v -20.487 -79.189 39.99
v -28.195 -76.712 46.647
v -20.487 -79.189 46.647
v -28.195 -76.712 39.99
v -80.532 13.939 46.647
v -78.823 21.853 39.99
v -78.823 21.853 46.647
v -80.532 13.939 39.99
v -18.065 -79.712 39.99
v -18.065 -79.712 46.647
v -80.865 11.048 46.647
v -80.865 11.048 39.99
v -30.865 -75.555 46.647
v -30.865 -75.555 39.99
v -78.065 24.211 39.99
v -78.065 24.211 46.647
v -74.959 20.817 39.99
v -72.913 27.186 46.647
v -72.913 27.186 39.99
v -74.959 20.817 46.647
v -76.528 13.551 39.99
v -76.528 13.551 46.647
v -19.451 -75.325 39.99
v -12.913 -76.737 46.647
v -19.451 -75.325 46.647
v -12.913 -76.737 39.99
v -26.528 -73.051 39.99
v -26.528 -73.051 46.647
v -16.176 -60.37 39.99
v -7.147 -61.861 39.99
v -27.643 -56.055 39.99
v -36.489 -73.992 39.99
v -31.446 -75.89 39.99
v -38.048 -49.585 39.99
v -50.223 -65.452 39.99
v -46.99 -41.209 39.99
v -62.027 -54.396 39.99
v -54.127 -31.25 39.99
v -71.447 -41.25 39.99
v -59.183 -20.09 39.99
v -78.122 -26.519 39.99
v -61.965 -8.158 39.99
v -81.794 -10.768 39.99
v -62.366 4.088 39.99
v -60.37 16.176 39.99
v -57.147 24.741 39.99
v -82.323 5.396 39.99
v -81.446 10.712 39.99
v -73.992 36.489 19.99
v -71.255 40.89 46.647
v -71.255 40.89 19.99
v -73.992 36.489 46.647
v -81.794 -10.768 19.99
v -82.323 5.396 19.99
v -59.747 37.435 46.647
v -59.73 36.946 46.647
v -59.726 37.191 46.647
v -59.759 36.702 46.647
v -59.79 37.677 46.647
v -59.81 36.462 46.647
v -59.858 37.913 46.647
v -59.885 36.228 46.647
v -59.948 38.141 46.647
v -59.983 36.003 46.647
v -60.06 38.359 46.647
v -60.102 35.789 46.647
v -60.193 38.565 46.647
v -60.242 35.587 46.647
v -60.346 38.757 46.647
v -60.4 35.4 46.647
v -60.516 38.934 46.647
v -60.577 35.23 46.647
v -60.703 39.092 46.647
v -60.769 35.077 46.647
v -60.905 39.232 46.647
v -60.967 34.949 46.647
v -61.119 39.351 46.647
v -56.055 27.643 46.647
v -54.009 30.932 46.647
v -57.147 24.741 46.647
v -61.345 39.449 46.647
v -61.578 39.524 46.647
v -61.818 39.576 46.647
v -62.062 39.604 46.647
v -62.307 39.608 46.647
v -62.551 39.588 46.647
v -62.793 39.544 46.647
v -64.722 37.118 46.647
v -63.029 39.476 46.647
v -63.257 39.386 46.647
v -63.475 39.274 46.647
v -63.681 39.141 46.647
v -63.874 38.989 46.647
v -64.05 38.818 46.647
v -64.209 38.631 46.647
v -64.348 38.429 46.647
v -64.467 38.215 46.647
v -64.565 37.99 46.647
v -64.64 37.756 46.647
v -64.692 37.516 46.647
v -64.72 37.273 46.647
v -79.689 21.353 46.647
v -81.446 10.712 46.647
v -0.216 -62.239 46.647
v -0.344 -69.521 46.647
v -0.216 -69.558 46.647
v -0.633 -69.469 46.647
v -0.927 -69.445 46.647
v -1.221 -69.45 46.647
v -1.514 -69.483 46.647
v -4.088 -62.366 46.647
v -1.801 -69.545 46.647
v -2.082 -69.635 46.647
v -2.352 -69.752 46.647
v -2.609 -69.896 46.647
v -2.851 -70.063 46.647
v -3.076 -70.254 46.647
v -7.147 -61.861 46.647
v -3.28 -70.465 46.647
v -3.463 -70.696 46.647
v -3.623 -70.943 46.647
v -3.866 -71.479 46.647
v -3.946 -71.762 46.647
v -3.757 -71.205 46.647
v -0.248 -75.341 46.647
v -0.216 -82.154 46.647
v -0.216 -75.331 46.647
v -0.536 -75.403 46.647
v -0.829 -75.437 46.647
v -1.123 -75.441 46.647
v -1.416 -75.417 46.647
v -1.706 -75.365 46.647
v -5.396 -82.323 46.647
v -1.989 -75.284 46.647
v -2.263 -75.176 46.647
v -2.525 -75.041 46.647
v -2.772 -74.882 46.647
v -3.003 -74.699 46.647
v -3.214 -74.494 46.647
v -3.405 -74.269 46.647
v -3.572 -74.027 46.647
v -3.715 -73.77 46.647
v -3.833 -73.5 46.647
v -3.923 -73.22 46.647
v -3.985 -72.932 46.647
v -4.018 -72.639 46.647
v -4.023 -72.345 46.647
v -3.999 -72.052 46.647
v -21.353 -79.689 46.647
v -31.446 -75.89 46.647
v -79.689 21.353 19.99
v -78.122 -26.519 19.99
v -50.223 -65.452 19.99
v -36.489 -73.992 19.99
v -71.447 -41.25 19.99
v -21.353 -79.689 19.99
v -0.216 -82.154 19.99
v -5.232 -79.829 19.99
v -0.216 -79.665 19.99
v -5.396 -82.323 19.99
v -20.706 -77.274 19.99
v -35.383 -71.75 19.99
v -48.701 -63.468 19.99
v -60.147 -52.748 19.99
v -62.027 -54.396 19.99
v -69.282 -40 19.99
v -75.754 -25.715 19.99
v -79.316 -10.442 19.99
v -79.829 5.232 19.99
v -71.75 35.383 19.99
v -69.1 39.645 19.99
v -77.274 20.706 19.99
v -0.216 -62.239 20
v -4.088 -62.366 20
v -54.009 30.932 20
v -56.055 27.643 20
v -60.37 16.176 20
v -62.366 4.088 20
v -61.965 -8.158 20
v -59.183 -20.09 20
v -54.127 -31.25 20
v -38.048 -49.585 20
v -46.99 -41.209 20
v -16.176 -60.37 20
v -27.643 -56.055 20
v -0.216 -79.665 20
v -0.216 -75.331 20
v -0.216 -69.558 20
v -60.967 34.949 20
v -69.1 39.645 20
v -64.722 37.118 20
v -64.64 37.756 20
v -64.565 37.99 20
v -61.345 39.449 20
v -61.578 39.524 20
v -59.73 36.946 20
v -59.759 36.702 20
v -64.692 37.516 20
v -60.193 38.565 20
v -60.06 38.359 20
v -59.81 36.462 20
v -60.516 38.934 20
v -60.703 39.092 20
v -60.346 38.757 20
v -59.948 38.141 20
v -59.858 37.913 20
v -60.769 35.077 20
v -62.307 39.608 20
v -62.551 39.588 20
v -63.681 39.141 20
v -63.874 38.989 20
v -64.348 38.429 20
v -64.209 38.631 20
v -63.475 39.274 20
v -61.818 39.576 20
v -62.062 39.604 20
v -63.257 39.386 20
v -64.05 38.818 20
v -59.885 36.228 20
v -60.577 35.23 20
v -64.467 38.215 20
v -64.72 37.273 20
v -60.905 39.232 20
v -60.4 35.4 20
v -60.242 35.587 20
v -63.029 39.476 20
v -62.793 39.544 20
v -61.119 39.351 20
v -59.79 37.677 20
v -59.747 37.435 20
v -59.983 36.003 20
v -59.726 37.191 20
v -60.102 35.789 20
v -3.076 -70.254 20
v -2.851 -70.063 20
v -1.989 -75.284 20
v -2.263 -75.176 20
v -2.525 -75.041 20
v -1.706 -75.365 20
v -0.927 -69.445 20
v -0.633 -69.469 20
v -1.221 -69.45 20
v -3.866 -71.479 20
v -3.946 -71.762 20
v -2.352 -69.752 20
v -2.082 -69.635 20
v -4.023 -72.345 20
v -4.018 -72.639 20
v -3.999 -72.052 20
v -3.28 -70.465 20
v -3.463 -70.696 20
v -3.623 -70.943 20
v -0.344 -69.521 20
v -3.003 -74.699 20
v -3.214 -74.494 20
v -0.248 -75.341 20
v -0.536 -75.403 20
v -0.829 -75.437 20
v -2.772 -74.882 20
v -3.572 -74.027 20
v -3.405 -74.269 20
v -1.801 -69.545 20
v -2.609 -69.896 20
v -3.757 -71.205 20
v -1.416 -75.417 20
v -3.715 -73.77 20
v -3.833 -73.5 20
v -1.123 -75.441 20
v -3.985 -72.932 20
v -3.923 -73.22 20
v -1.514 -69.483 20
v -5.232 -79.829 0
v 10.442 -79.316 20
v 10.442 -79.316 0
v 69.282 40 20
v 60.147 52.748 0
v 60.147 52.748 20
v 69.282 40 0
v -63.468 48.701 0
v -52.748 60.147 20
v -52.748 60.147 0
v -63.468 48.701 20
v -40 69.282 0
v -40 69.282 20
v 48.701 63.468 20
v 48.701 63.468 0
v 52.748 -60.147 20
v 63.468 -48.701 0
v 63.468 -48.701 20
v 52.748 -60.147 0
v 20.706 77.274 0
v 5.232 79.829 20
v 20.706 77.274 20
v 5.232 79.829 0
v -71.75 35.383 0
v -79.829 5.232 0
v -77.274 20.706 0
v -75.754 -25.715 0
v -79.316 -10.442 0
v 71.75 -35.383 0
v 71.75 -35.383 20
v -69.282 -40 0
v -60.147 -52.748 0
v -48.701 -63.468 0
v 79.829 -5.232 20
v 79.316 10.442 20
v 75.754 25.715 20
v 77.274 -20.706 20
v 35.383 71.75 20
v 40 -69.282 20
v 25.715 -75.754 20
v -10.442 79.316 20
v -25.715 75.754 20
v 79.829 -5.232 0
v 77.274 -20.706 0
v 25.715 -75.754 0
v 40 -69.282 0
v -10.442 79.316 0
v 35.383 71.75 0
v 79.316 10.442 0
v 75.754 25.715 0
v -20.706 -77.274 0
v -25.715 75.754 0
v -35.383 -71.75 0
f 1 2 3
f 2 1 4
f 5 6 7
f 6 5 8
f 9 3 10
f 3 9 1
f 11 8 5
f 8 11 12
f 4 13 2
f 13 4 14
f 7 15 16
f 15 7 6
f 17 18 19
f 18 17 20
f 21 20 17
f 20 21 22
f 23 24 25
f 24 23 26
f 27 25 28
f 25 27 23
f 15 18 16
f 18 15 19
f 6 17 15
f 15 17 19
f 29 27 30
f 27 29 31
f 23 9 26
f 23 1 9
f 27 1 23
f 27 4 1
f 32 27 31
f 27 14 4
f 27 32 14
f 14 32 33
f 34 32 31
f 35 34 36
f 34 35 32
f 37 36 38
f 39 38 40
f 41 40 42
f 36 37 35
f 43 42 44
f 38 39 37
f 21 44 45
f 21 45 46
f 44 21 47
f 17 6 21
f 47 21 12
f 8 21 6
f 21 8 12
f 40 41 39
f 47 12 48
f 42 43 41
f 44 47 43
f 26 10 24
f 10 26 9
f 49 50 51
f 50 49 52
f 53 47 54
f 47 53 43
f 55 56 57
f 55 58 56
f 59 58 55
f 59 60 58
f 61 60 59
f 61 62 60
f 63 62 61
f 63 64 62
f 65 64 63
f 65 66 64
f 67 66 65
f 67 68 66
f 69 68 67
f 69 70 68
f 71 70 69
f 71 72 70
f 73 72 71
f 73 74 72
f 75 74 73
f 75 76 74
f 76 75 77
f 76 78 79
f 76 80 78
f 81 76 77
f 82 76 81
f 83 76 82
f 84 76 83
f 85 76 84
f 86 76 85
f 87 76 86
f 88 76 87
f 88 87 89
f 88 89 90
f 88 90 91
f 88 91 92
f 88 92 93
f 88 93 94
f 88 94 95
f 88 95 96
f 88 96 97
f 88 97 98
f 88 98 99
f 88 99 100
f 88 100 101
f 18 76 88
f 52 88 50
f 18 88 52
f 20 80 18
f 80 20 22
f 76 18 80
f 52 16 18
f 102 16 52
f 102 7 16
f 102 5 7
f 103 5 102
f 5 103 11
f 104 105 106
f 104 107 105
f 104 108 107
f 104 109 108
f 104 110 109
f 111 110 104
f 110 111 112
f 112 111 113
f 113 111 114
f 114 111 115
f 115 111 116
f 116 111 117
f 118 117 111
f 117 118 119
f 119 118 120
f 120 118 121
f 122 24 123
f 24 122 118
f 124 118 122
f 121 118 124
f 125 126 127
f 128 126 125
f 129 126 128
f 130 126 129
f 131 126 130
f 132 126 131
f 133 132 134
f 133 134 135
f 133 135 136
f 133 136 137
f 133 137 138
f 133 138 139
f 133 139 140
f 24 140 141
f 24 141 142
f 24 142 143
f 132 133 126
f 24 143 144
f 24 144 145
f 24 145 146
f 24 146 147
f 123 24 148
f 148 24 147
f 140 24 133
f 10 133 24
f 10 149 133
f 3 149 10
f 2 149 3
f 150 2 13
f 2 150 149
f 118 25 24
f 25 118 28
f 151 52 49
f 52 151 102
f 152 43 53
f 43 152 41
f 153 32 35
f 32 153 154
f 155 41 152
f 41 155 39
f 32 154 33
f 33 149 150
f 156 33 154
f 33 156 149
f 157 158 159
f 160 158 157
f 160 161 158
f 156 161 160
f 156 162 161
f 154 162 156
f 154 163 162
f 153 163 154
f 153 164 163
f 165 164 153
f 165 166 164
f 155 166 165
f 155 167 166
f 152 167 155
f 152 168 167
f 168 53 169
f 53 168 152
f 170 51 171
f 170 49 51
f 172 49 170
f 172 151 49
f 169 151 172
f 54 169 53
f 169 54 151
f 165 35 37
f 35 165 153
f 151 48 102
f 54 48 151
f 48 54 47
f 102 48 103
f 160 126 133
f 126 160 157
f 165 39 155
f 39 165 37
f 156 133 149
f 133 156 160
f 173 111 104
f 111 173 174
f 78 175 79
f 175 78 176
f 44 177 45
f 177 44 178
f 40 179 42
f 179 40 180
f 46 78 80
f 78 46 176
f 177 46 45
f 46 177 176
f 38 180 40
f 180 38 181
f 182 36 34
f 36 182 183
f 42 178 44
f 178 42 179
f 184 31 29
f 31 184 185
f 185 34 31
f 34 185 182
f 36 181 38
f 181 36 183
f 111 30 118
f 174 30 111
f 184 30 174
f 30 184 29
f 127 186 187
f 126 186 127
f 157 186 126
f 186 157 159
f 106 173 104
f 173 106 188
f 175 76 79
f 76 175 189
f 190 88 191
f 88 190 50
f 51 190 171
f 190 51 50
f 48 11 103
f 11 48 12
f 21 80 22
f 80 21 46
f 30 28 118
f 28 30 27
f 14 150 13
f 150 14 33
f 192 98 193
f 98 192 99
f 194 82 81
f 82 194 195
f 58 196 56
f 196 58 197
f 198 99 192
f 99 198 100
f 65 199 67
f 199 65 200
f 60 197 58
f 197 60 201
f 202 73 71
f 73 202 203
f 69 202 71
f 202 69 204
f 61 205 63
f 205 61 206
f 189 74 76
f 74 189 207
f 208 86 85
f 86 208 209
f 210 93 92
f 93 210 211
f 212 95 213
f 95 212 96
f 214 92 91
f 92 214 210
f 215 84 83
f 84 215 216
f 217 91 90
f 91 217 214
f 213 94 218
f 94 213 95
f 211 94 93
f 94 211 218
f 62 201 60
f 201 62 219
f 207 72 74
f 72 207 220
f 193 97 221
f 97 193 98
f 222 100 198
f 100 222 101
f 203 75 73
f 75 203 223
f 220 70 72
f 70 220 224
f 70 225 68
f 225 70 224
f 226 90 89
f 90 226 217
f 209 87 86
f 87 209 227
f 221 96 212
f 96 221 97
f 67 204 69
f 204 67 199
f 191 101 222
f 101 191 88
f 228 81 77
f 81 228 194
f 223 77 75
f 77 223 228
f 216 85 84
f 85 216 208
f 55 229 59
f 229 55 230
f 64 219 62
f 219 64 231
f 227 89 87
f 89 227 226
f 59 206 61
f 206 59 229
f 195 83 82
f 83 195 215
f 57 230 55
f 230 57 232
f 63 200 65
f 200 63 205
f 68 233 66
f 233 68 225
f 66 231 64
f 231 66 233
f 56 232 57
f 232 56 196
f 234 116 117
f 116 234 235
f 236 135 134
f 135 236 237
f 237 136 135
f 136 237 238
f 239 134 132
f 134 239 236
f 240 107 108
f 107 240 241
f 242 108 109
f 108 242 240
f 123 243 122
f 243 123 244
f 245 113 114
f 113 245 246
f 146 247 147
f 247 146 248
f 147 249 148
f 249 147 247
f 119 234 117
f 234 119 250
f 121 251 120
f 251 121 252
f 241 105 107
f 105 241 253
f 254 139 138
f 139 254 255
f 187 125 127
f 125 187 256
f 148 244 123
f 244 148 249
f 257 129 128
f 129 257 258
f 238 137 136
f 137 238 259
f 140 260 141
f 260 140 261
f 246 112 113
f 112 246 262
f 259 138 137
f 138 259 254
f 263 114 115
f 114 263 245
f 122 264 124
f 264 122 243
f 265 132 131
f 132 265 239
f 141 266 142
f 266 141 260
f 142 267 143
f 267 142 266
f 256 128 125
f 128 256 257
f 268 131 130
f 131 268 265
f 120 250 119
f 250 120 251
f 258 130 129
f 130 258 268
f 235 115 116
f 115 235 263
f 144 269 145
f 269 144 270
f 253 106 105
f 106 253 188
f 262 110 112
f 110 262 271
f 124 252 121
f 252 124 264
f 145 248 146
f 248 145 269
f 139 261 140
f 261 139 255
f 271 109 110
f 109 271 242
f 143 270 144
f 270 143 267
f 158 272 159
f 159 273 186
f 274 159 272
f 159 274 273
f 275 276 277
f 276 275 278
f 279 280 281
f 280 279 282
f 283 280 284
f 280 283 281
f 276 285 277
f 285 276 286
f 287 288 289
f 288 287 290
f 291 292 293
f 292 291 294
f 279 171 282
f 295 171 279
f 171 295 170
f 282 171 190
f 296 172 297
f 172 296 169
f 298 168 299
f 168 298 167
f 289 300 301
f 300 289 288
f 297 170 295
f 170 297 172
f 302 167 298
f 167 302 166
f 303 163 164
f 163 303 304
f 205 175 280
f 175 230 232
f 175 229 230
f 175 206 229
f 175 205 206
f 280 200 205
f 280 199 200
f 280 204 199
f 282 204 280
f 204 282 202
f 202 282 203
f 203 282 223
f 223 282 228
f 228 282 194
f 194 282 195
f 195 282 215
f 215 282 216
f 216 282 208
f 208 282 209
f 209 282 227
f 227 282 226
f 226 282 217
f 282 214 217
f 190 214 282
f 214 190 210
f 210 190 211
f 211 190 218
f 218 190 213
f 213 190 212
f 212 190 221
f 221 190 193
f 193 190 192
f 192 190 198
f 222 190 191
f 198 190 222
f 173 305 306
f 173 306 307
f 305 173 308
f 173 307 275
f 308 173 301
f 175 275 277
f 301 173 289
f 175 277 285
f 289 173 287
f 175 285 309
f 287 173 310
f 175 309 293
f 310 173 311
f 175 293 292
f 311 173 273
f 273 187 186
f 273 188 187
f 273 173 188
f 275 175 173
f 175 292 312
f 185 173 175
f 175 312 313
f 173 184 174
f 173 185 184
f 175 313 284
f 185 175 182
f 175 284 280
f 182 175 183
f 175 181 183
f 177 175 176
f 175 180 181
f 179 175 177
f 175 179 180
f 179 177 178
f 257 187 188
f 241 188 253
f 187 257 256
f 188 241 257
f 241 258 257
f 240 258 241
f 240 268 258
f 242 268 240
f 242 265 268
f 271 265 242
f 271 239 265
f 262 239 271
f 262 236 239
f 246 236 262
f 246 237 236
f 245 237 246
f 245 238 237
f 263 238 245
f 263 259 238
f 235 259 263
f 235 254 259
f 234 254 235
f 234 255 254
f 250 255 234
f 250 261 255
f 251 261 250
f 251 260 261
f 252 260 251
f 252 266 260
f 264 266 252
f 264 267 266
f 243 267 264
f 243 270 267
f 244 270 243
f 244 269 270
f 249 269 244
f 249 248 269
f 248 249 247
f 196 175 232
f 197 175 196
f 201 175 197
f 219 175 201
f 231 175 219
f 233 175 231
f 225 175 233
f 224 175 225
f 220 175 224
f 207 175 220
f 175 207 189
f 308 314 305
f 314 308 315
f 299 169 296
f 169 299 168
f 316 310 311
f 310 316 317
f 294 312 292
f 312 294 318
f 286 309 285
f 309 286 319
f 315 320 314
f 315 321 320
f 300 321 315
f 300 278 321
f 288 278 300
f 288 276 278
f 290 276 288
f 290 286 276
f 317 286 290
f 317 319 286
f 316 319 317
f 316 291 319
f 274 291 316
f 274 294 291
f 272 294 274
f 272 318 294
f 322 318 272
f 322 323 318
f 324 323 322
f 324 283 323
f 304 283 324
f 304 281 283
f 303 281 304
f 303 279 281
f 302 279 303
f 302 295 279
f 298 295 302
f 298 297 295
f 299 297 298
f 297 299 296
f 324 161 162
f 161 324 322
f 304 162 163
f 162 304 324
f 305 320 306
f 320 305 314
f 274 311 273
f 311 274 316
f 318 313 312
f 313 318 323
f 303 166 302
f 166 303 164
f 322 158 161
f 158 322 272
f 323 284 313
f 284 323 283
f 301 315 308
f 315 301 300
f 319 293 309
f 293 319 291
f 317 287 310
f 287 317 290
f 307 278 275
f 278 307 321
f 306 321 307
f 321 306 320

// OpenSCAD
$fn=64;
rotate(a = [0, 0, 120])
union(){cylinder(h = 20, ifn = 32, r = 80.000, $fn = 32);
translate(v = [0, 0, 19.990])
difference(){union(){difference(){cylinder(h = 26.657, r = 82.500, $fn = 32);
translate(v = [0, 0, -0.010])
cylinder(h = 26.677, ifn = 32, r = 62.500, $fn = 32);
translate(v = [0, 0.250, -0.500])
linear_extrude(height = 47.667){translate(v = [-82.500, 0])
polygon(points = [[0, 0], [82.500, 0.000], [0, 47.631], [0, 0]]);
}
translate(v = [0, 0.250, -0.500])
linear_extrude(height = 47.667){translate(v = [82.500, 0])
mirror(v = [1, 0])
polygon(points = [[0, 0], [82.500, 0.000], [0, 47.631], [0, 0]]);
}
translate(v = [0, -155, -0.500])
translate(v = [-83.500, 0])
cube(size = [167, 165, 47.667]);
translate(v = [0, -1])
intersection(){translate(v = [0, 0, 20])
translate(v = [-60.000, 0])
cube(size = [120, 120, 6.667]);
difference(){cylinder(h = 46.667, r = 82.500);
translate(v = [0, 0, -0.010])
cylinder(h = 46.687, r = 78.500);
}
}
translate(v = [0, 0, 20])
translate(v = [-50.000, 0])
cube(size = [100, 100, 6.667]);
}
translate(v = [63.250, 35.334])
cylinder(h = 26.657, r = 2.500);
}
rotate(a = [0, 0, 120])
translate(v = [63.250, 35.334, -0.500])
cylinder(h = 47.667, r = 3.000);
}
}
